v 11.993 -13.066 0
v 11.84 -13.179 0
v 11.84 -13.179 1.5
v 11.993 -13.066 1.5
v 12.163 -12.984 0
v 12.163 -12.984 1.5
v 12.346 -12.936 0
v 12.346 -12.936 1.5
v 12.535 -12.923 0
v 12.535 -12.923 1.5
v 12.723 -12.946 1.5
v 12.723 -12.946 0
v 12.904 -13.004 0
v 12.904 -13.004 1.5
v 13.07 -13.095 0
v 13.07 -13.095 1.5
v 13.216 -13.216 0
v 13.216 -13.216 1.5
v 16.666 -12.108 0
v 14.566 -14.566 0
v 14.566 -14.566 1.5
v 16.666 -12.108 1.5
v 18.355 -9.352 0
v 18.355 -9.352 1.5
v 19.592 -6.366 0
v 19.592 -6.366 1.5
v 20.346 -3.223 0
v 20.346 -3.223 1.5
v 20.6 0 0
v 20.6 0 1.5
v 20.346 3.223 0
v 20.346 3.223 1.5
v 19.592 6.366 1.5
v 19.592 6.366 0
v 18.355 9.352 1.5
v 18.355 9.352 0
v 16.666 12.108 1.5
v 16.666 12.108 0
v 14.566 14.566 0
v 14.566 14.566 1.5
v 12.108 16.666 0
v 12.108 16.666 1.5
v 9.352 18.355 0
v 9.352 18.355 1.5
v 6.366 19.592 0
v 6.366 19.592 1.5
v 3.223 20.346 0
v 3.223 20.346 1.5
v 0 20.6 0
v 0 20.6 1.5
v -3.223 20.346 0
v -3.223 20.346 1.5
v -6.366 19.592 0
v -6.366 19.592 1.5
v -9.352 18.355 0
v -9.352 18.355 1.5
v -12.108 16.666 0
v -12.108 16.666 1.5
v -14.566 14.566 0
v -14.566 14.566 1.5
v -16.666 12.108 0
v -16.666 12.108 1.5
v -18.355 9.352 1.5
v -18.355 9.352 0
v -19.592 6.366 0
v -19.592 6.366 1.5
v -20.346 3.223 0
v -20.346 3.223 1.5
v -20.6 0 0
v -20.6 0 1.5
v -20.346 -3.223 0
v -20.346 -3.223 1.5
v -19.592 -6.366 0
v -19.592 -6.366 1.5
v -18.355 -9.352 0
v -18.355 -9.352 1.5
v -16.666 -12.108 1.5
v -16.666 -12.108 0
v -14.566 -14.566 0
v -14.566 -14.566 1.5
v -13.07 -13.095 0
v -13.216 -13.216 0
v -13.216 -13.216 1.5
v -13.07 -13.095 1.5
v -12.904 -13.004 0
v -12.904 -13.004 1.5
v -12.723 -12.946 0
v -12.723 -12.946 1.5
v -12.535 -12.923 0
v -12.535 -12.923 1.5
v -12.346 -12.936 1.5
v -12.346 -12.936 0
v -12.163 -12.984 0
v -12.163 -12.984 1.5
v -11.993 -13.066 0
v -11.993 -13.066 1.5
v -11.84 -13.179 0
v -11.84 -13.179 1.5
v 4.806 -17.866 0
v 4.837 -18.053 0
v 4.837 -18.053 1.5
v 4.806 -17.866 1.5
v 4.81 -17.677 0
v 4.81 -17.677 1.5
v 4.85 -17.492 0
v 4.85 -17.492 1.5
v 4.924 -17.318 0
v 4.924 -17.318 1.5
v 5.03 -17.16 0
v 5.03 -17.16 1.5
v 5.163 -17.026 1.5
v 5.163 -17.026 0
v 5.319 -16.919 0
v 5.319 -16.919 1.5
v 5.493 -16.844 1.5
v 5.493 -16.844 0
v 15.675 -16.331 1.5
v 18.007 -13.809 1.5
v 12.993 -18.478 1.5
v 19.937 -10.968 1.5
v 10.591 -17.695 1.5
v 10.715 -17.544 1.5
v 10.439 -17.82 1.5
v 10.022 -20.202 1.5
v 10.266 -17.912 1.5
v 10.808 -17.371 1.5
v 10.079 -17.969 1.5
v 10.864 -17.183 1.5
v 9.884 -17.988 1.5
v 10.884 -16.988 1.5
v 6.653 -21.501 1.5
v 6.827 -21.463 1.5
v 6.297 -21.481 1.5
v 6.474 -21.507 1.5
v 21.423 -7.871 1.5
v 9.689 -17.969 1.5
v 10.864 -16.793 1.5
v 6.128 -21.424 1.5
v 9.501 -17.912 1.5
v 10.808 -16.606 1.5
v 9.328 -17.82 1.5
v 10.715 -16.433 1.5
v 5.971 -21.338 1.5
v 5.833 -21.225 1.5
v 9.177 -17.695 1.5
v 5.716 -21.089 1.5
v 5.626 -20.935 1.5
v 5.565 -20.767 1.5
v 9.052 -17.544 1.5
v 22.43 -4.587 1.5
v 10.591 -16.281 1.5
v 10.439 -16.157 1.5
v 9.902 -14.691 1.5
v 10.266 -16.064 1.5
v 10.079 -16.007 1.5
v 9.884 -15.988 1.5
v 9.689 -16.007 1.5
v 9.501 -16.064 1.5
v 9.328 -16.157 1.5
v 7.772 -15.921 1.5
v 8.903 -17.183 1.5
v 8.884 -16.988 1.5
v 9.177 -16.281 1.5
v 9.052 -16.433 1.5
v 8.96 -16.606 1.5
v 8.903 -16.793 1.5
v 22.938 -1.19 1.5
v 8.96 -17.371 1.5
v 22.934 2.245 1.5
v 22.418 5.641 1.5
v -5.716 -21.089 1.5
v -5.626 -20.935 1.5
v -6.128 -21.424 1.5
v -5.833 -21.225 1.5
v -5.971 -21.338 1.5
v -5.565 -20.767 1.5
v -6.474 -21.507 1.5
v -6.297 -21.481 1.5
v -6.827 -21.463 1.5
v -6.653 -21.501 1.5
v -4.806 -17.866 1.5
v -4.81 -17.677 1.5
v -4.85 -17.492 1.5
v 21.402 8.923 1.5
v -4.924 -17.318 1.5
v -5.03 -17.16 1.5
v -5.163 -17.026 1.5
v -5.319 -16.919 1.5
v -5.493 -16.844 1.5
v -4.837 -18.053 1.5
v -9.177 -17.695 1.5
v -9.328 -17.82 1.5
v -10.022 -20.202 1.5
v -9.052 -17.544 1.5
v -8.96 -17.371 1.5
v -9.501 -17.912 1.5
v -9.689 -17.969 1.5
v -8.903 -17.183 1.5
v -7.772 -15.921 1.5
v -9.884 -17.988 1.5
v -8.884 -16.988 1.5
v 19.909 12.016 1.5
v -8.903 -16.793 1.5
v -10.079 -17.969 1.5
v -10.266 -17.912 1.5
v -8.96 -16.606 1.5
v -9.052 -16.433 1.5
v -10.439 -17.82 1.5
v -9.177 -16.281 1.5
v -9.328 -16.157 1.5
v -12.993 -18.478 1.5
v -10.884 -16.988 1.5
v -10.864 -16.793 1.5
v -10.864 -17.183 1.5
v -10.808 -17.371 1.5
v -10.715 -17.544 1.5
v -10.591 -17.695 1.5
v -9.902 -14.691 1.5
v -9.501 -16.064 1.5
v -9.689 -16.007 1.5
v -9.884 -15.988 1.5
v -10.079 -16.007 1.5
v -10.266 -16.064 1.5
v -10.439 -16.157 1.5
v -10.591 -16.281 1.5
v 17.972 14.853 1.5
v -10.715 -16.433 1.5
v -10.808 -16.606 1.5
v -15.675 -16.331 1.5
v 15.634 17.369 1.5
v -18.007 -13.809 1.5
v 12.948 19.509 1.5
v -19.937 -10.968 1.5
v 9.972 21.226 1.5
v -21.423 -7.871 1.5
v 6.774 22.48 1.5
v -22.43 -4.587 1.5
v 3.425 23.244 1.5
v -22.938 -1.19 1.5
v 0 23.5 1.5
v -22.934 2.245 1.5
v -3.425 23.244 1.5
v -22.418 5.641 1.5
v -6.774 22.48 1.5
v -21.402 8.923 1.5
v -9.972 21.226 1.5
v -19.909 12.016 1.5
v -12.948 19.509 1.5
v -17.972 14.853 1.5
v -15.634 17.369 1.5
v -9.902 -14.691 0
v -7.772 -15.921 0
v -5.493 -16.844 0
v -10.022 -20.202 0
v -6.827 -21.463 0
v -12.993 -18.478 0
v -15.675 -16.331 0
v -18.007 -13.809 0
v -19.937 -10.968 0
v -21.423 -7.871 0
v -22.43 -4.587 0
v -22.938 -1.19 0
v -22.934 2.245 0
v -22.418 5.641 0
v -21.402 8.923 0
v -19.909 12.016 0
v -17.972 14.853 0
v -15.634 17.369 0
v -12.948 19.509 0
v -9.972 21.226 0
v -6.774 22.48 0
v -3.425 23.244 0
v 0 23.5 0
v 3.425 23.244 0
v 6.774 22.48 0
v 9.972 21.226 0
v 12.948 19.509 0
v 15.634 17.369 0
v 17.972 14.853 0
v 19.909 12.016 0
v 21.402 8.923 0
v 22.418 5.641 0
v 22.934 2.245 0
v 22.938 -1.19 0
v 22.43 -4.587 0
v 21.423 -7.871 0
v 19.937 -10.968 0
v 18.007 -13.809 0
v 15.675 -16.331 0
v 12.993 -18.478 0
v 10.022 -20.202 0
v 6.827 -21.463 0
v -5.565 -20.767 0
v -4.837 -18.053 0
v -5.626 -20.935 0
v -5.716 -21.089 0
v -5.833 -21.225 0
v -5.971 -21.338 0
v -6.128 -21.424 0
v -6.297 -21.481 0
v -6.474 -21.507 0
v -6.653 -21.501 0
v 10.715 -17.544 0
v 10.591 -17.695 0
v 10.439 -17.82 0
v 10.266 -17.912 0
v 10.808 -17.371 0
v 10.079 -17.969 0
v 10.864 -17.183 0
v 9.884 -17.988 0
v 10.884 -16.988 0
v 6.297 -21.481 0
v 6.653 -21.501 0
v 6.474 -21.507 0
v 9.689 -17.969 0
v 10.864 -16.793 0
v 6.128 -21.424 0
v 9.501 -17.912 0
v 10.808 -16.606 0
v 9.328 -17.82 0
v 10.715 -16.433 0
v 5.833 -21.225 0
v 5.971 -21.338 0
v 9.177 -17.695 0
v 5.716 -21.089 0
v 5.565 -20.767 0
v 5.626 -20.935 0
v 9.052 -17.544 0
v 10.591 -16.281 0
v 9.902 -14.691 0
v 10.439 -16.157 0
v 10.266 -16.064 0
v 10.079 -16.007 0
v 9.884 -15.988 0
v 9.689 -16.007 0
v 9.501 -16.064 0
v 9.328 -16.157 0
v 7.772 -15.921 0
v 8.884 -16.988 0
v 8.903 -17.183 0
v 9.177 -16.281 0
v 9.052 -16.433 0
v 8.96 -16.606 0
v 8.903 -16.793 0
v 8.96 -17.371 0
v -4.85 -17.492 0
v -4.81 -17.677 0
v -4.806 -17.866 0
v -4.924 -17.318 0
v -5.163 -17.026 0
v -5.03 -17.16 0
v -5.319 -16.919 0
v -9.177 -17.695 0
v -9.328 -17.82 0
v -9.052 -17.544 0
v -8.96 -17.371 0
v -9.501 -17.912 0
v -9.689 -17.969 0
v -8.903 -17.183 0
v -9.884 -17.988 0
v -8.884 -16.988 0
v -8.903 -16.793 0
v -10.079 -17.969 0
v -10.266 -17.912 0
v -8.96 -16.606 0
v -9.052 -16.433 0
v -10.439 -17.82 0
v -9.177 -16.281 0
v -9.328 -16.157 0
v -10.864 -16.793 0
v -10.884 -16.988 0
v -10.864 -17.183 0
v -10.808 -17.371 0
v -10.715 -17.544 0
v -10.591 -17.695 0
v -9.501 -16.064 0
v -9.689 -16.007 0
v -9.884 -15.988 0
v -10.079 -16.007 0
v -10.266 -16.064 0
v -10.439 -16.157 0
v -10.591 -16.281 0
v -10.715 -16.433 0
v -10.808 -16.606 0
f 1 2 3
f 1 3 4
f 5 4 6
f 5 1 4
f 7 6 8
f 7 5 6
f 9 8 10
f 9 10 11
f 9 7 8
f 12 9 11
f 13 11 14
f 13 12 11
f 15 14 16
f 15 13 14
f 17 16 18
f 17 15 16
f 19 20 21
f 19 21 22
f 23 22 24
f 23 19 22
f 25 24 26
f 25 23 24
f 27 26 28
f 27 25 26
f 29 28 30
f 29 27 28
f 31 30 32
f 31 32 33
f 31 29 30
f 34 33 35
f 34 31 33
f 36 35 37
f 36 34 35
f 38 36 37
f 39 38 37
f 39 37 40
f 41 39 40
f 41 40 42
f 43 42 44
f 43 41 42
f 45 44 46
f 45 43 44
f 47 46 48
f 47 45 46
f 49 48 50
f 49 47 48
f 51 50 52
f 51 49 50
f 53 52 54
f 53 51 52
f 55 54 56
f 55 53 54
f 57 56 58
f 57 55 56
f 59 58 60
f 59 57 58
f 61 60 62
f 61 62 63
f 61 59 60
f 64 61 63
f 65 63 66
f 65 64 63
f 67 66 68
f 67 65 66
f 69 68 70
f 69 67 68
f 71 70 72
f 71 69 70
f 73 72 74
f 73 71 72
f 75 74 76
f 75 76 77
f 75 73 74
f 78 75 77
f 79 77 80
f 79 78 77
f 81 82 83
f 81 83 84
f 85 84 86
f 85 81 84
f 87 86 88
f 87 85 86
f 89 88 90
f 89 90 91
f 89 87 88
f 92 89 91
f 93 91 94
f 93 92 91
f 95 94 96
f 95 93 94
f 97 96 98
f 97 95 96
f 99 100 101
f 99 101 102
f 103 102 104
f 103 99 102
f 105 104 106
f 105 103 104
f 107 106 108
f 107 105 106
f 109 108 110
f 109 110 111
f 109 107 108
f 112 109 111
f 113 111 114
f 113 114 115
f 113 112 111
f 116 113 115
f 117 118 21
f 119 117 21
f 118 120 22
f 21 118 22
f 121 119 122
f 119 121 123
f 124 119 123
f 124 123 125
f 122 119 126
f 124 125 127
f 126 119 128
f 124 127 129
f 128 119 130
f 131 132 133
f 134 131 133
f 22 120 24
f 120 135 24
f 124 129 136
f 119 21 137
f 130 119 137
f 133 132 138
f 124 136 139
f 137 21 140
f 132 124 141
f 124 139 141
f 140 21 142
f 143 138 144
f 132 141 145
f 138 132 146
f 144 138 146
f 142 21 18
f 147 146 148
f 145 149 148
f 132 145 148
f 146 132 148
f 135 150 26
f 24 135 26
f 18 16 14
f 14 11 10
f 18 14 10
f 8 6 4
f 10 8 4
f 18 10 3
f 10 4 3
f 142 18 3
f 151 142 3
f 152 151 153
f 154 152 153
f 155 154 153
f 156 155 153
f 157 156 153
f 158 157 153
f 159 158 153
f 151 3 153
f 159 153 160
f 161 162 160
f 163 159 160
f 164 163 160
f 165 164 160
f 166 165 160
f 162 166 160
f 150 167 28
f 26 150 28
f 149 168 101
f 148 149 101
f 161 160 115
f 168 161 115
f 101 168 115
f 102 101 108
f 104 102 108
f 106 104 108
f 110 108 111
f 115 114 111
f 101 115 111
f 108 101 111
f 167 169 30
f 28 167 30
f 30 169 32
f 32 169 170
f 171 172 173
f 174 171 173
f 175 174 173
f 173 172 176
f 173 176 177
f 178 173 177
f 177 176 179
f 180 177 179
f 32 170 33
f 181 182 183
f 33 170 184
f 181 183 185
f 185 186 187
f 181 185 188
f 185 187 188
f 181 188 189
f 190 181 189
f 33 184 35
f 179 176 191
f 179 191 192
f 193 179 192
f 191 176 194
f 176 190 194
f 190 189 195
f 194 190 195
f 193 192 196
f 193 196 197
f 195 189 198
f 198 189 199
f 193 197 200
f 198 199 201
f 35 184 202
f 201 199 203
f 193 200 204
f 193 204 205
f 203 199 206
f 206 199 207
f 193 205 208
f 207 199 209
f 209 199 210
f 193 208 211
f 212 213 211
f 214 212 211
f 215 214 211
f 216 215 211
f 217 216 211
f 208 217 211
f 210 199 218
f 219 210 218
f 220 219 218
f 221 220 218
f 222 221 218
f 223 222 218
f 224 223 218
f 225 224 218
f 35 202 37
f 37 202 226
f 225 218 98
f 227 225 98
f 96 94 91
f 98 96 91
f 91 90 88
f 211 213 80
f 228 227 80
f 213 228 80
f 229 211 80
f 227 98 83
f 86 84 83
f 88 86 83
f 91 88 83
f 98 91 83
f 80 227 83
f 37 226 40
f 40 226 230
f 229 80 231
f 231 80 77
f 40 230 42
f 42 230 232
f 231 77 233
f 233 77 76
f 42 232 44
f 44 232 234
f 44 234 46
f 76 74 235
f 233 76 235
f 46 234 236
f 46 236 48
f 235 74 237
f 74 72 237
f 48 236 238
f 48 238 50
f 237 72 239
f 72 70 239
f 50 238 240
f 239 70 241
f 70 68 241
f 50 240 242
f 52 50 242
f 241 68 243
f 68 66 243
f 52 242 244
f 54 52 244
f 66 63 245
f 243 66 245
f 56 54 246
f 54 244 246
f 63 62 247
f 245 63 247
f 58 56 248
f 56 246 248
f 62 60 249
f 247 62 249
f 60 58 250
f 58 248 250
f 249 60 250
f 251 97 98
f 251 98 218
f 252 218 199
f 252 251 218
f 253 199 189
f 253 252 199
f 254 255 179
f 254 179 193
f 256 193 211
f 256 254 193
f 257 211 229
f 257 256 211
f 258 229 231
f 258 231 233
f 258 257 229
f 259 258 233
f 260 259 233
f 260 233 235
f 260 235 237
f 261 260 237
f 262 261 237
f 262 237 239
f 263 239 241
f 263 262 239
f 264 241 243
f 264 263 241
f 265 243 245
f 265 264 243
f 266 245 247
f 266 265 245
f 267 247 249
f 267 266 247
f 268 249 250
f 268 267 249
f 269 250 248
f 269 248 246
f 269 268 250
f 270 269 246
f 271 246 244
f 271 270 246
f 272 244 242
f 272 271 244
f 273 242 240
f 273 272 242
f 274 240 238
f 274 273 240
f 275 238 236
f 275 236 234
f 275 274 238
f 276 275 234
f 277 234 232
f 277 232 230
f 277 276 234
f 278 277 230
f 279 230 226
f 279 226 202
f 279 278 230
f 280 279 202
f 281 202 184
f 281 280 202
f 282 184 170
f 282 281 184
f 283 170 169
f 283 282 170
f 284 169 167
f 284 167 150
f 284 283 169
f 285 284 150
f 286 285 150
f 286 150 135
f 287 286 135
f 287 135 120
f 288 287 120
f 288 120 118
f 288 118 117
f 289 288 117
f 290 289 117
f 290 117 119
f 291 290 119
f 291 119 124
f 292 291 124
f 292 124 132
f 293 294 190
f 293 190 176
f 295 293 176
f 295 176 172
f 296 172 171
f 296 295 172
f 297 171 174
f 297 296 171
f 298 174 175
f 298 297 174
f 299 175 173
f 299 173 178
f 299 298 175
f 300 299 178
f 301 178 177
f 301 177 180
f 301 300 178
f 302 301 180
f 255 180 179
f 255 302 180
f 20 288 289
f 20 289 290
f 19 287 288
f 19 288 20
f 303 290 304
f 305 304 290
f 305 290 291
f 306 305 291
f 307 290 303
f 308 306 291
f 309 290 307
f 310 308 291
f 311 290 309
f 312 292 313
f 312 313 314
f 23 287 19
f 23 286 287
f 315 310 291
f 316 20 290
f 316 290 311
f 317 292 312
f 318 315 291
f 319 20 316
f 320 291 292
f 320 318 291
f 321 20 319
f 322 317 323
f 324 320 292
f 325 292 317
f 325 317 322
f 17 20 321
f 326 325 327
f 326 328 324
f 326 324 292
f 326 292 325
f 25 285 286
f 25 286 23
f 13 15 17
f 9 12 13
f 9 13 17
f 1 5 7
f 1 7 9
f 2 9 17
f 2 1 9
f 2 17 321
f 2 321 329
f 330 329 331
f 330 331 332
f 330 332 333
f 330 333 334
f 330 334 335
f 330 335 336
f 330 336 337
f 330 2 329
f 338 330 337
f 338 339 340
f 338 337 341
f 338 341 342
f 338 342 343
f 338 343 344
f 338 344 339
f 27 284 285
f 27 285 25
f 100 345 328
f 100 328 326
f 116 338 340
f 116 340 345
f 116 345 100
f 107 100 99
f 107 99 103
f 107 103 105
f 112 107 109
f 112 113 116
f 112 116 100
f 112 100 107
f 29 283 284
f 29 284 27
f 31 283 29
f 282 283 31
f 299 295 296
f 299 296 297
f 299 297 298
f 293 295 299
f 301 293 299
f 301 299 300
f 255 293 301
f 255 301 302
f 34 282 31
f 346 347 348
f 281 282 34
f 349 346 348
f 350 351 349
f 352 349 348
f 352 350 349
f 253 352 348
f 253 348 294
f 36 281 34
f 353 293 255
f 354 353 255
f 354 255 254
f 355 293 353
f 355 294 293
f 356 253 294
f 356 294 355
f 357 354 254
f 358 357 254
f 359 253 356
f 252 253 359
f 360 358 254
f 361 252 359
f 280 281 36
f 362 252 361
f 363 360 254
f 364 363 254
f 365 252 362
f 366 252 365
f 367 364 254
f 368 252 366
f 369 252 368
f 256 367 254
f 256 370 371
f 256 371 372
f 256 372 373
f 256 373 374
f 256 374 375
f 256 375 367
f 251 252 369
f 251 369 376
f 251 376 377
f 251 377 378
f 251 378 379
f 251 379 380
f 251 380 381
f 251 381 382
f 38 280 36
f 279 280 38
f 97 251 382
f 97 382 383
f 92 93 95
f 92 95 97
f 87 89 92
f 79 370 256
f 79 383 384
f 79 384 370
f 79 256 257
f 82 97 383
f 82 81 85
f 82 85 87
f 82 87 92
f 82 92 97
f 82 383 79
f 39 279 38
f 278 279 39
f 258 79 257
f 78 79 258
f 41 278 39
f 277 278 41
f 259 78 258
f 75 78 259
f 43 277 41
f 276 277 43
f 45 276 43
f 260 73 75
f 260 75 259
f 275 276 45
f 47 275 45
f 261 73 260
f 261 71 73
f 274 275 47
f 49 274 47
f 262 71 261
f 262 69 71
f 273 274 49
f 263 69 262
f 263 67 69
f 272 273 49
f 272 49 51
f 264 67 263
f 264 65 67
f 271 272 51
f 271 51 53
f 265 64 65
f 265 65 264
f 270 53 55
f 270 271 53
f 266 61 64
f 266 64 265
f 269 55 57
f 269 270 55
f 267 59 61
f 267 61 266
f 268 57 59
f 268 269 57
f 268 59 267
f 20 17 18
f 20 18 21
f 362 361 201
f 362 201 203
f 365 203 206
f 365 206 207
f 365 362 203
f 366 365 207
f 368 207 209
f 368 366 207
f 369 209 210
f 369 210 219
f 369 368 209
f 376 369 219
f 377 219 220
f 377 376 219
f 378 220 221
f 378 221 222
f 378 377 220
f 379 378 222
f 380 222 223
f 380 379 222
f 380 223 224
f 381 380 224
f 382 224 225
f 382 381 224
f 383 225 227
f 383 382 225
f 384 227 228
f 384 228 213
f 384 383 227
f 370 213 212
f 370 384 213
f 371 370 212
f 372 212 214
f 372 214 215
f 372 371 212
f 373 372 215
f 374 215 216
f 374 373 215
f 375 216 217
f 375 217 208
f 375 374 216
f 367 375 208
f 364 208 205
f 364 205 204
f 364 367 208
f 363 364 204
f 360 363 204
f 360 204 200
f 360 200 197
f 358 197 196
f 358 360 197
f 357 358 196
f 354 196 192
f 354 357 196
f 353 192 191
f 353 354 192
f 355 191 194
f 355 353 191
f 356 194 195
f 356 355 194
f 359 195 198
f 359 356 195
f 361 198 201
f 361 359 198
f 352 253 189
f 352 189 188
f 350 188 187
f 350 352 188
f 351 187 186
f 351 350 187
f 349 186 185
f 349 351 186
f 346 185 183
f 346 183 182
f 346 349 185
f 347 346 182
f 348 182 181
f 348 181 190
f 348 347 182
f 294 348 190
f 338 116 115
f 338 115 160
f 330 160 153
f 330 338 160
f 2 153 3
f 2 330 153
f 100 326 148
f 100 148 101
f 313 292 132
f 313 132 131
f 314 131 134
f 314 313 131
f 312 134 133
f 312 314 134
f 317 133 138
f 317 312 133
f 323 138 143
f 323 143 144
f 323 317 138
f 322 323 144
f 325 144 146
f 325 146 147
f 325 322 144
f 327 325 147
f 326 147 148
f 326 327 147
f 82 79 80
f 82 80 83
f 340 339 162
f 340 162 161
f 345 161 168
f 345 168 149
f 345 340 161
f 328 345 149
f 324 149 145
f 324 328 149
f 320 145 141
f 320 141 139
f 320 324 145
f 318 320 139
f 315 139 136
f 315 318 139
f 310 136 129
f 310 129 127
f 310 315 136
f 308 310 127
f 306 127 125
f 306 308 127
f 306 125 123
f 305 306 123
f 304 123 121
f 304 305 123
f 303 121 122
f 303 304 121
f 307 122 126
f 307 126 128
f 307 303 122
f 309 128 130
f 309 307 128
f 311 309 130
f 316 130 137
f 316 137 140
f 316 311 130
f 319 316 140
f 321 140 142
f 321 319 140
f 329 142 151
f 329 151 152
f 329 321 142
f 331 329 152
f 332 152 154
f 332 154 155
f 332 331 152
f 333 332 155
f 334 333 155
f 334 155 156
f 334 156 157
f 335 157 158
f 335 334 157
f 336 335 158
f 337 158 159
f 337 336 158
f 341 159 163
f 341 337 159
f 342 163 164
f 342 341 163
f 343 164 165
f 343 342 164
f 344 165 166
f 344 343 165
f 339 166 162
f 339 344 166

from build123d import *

# Parameters (mm, degrees)
ESQUISSE1_R          = 1
BASE_EXTRUSION_DEPTH = 1.5


with BuildPart() as part:
    # Esquisse1 → Base-Extrusion (new body)
    with BuildSketch(Plane.XY):
        with BuildLine():
            Line((5.564558924, -20.767216626), (4.837312367, -18.053095527))
            ThreePointArc((4.837312367, -18.053095527), (4.924160237, -17.31759845), (5.493181049, -16.84355856))
            ThreePointArc((5.493181049, -16.84355856), (8.858336511, -15.343088908), (11.840359078, -13.179013616))
            ThreePointArc((11.840359078, -13.179013616), (12.535400072, -12.923247082), (13.215783159, -13.215783159))
            Line((13.215783159, -13.215783159), (14.566399692, -14.566399692))
            ThreePointArc((14.566399692, -14.566399692), (0, 20.6), (-14.566399692, -14.566399692))
            Line((-14.566399692, -14.566399692), (-13.215783159, -13.215783159))
            ThreePointArc((-13.215783159, -13.215783159), (-12.535400072, -12.923247082), (-11.840359078, -13.179013616))
            ThreePointArc((-11.840359078, -13.179013616), (-8.858336511, -15.343088908), (-5.493181049, -16.84355856))
            ThreePointArc((-5.493181049, -16.84355856), (-4.924160237, -17.31759845), (-4.837312367, -18.053095527))
            Line((-4.837312367, -18.053095527), (-5.564558924, -20.767216626))
            ThreePointArc((-5.564558924, -20.767216626), (-6.047721334, -21.384148392), (-6.827324966, -21.463324744))
            ThreePointArc((-6.827324966, -21.463324744), (0, 23.5), (6.827324966, -21.463324744))
            ThreePointArc((6.827324966, -21.463324744), (6.047721334, -21.384148392), (5.564558924, -20.767216626))
        make_face()
        with Locations((-9.883667669, -16.988277884)):
            Circle(ESQUISSE1_R, mode=Mode.SUBTRACT)
        with Locations(Location((9.883667669, -16.988277884, 0), (0, 0, 180))):
            Circle(ESQUISSE1_R, mode=Mode.SUBTRACT)
    extrude(amount=BASE_EXTRUSION_DEPTH)


solid = part.part
